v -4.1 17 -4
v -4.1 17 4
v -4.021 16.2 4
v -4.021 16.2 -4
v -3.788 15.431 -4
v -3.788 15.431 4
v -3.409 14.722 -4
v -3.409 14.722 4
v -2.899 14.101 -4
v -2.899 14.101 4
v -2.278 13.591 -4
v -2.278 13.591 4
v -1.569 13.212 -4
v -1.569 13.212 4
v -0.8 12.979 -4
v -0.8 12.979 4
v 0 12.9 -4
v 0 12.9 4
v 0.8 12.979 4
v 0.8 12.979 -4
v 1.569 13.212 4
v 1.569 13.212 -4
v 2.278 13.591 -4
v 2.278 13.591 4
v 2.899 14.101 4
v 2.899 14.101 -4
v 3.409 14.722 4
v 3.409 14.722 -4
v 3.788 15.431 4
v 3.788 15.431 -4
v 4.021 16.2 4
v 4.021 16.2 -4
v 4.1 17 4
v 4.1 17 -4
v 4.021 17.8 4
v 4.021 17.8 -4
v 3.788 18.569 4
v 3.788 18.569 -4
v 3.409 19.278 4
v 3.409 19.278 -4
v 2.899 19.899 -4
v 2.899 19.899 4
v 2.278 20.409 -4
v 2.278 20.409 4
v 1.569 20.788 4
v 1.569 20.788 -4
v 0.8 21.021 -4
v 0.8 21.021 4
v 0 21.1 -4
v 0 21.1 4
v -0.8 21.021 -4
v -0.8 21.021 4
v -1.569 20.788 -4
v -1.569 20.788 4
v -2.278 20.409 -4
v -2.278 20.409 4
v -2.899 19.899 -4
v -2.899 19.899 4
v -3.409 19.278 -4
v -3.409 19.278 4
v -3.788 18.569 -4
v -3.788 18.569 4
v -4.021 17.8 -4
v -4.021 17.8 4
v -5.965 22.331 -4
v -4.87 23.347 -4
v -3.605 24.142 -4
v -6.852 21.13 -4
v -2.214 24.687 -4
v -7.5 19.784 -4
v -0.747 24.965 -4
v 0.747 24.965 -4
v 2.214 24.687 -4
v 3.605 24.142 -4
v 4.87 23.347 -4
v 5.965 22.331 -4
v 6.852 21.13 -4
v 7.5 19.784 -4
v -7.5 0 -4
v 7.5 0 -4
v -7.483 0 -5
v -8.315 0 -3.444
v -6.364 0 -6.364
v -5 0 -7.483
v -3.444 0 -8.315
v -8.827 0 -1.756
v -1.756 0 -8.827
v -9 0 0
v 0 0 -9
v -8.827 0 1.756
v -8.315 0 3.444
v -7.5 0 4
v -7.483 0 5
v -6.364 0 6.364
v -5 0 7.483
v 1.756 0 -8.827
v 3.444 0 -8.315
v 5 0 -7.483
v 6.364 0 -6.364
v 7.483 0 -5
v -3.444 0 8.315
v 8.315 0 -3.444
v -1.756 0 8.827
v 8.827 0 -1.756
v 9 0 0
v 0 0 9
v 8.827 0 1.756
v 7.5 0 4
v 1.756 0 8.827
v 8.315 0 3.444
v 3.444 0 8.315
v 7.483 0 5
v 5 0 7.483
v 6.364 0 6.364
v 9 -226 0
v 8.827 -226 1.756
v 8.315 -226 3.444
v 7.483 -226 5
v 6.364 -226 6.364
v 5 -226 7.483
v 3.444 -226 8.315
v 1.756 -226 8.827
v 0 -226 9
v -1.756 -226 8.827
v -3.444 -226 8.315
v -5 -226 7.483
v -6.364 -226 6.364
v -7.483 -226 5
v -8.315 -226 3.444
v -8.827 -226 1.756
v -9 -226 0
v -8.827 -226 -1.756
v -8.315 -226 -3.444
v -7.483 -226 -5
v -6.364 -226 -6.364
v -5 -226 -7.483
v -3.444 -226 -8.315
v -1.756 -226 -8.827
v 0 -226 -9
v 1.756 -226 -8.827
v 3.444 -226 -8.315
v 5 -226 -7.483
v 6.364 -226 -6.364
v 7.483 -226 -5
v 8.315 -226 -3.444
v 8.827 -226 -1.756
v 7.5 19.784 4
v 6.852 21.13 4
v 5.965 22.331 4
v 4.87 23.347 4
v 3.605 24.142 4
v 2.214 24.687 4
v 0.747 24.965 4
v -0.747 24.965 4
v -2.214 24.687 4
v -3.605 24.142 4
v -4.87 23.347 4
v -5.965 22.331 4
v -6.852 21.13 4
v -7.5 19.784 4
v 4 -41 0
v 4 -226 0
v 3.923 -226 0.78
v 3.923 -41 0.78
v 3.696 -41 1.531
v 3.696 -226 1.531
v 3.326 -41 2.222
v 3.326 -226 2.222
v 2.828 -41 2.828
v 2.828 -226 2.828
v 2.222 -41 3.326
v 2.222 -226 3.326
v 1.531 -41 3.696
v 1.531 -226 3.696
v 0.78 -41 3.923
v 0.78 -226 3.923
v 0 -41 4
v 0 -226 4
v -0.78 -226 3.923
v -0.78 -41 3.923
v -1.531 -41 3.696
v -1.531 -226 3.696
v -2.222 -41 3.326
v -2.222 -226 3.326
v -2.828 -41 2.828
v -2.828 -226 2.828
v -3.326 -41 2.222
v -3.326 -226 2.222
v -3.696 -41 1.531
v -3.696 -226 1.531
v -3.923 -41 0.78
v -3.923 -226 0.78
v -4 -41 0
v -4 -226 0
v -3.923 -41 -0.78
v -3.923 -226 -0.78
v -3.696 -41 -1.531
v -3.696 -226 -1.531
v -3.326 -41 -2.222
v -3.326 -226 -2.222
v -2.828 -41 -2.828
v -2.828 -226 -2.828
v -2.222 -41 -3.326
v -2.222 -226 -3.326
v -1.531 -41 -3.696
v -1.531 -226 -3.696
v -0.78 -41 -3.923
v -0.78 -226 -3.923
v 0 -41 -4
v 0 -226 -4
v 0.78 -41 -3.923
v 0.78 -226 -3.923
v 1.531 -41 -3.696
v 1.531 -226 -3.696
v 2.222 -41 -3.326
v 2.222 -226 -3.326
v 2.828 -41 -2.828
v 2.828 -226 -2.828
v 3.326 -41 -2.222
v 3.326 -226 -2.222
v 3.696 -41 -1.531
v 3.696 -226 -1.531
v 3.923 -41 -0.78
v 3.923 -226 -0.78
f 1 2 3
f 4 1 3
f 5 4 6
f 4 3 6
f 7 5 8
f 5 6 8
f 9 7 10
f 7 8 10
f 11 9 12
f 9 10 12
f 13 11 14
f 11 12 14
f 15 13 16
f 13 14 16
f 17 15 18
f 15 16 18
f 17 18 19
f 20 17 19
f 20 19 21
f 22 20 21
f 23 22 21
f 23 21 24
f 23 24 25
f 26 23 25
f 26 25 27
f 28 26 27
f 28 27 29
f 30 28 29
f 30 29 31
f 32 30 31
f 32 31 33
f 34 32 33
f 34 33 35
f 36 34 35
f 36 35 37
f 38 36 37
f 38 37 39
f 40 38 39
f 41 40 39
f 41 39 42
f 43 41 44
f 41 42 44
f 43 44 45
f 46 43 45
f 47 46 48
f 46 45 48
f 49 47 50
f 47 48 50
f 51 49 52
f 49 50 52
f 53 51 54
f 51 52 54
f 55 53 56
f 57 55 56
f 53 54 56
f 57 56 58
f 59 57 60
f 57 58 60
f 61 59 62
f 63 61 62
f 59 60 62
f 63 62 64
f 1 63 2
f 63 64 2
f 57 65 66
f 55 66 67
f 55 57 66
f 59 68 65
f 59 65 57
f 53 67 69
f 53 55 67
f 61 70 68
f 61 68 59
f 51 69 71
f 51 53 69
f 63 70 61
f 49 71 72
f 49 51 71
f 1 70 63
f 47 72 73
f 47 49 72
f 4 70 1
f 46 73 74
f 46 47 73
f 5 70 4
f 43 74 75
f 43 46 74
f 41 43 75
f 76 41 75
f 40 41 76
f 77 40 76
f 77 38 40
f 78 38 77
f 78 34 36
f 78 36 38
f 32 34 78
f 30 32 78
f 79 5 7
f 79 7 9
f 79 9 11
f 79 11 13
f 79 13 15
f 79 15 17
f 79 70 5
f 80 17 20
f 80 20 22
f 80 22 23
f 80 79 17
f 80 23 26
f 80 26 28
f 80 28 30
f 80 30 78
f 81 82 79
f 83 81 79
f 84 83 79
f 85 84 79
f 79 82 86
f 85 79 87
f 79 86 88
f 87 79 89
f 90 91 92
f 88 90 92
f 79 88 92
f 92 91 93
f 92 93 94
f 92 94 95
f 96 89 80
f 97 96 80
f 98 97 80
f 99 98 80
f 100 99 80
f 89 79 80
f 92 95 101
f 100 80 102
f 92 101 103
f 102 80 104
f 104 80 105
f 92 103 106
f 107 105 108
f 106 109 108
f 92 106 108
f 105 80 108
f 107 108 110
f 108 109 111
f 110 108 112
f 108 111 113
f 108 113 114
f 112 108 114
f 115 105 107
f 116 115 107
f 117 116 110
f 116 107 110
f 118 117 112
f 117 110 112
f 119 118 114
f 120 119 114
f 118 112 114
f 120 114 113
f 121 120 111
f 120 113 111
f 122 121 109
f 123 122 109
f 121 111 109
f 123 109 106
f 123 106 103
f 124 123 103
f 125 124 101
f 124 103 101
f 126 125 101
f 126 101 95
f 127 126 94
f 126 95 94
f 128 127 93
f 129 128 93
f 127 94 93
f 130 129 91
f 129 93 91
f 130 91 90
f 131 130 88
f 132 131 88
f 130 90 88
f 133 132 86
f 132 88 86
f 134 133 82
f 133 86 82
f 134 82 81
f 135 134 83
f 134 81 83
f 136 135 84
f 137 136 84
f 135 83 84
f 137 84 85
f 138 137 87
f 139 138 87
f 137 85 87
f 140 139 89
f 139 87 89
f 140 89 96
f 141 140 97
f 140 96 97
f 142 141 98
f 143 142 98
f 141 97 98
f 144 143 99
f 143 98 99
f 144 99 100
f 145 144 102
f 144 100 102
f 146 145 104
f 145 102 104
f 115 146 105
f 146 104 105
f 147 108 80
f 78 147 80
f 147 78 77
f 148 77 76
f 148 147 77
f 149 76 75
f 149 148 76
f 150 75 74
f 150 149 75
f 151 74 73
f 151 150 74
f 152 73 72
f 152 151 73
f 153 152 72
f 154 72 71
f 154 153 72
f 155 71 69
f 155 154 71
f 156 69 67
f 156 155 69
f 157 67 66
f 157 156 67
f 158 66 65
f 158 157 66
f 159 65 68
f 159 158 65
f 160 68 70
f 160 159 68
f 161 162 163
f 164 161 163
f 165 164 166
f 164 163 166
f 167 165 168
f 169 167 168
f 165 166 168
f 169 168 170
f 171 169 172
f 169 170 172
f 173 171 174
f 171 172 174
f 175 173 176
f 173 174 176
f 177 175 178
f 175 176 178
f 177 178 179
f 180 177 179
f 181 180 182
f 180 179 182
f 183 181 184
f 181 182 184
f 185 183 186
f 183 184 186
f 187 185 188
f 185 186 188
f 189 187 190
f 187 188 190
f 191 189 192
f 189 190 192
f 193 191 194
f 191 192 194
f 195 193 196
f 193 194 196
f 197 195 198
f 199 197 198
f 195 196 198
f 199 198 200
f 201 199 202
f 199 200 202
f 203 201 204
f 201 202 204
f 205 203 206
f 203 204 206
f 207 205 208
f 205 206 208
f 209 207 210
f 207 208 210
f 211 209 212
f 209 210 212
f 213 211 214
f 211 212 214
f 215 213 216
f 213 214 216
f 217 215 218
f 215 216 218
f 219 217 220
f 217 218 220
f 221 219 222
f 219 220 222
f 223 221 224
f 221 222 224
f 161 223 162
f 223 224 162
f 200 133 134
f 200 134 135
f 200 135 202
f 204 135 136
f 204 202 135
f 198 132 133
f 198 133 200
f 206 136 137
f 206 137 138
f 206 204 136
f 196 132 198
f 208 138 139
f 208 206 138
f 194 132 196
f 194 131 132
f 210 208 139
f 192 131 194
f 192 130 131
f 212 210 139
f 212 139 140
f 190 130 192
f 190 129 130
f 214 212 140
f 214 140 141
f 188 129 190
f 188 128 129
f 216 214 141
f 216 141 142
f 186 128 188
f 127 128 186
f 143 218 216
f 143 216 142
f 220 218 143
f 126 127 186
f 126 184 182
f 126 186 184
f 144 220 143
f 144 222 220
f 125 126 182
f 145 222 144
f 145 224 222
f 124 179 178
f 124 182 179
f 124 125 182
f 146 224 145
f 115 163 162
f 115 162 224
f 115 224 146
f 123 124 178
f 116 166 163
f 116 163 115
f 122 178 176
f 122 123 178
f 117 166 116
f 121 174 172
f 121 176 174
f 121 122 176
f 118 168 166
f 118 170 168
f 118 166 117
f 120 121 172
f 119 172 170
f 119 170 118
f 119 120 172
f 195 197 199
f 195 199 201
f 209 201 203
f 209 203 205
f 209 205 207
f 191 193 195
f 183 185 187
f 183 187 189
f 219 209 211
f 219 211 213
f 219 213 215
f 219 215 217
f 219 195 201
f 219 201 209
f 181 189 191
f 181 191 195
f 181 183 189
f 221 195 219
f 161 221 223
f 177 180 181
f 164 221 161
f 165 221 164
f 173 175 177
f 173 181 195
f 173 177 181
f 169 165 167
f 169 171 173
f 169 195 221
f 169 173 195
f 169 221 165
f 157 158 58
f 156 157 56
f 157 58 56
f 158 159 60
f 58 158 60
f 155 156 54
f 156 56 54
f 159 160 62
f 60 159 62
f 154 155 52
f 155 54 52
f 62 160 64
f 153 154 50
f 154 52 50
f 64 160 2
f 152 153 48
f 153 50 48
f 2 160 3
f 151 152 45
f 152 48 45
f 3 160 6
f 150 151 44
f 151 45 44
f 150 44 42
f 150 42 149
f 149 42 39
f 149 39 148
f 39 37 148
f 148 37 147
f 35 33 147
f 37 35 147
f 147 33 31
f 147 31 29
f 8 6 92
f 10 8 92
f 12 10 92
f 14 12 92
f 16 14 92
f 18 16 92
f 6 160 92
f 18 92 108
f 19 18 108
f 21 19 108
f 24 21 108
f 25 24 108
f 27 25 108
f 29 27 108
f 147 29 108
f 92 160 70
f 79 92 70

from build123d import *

# Parameters (mm, degrees)
SKETCH_R        = 9
PAD_DEPTH       = 226
SKETCH001_W     = 15
SKETCH001_H     = 8
PAD001_DEPTH    = 25
SKETCH002_R     = 4.1
POCKET_DEPTH    = 13.001
SKETCH003_R     = 4
POCKET001_DEPTH = 185


with BuildPart() as part:
    # Sketch → Pad (new body)
    with BuildSketch(Plane.XZ):
        Circle(SKETCH_R)
    extrude(amount=PAD_DEPTH)

    # Sketch001 (on Face2 of Pad) → Pad001 (join)
    with BuildSketch(Plane(origin=(0, 0, 0), x_dir=(1, 0, 0), z_dir=(0, 1, 0))):
        Rectangle(SKETCH001_W, SKETCH001_H)
    extrude(amount=PAD001_DEPTH)

    # Sketch002 (on Face6 of Pad001) → Pocket (cut, through all)
    with BuildSketch(Plane(origin=(0, 0, 4), x_dir=(-1, 0, 0), z_dir=(0, 0, 1))):
        with Locations((0, -17)):
            Circle(SKETCH002_R)
        with BuildLine():
            ThreePointArc((-8, -17), (0, -25), (8, -17))
            Line((8, -26), (8, -17))
            Line((-8, -26), (8, -26))
            Line((-8, -17), (-8, -26))
        make_face()
    extrude(amount=-POCKET_DEPTH, mode=Mode.SUBTRACT)

    # Sketch003 (on Face3 of Pocket) → Pocket001 (cut)
    with BuildSketch(Plane.XZ.offset(226)):
        Circle(SKETCH003_R)
    extrude(amount=-POCKET001_DEPTH, mode=Mode.SUBTRACT)


solid = part.part
